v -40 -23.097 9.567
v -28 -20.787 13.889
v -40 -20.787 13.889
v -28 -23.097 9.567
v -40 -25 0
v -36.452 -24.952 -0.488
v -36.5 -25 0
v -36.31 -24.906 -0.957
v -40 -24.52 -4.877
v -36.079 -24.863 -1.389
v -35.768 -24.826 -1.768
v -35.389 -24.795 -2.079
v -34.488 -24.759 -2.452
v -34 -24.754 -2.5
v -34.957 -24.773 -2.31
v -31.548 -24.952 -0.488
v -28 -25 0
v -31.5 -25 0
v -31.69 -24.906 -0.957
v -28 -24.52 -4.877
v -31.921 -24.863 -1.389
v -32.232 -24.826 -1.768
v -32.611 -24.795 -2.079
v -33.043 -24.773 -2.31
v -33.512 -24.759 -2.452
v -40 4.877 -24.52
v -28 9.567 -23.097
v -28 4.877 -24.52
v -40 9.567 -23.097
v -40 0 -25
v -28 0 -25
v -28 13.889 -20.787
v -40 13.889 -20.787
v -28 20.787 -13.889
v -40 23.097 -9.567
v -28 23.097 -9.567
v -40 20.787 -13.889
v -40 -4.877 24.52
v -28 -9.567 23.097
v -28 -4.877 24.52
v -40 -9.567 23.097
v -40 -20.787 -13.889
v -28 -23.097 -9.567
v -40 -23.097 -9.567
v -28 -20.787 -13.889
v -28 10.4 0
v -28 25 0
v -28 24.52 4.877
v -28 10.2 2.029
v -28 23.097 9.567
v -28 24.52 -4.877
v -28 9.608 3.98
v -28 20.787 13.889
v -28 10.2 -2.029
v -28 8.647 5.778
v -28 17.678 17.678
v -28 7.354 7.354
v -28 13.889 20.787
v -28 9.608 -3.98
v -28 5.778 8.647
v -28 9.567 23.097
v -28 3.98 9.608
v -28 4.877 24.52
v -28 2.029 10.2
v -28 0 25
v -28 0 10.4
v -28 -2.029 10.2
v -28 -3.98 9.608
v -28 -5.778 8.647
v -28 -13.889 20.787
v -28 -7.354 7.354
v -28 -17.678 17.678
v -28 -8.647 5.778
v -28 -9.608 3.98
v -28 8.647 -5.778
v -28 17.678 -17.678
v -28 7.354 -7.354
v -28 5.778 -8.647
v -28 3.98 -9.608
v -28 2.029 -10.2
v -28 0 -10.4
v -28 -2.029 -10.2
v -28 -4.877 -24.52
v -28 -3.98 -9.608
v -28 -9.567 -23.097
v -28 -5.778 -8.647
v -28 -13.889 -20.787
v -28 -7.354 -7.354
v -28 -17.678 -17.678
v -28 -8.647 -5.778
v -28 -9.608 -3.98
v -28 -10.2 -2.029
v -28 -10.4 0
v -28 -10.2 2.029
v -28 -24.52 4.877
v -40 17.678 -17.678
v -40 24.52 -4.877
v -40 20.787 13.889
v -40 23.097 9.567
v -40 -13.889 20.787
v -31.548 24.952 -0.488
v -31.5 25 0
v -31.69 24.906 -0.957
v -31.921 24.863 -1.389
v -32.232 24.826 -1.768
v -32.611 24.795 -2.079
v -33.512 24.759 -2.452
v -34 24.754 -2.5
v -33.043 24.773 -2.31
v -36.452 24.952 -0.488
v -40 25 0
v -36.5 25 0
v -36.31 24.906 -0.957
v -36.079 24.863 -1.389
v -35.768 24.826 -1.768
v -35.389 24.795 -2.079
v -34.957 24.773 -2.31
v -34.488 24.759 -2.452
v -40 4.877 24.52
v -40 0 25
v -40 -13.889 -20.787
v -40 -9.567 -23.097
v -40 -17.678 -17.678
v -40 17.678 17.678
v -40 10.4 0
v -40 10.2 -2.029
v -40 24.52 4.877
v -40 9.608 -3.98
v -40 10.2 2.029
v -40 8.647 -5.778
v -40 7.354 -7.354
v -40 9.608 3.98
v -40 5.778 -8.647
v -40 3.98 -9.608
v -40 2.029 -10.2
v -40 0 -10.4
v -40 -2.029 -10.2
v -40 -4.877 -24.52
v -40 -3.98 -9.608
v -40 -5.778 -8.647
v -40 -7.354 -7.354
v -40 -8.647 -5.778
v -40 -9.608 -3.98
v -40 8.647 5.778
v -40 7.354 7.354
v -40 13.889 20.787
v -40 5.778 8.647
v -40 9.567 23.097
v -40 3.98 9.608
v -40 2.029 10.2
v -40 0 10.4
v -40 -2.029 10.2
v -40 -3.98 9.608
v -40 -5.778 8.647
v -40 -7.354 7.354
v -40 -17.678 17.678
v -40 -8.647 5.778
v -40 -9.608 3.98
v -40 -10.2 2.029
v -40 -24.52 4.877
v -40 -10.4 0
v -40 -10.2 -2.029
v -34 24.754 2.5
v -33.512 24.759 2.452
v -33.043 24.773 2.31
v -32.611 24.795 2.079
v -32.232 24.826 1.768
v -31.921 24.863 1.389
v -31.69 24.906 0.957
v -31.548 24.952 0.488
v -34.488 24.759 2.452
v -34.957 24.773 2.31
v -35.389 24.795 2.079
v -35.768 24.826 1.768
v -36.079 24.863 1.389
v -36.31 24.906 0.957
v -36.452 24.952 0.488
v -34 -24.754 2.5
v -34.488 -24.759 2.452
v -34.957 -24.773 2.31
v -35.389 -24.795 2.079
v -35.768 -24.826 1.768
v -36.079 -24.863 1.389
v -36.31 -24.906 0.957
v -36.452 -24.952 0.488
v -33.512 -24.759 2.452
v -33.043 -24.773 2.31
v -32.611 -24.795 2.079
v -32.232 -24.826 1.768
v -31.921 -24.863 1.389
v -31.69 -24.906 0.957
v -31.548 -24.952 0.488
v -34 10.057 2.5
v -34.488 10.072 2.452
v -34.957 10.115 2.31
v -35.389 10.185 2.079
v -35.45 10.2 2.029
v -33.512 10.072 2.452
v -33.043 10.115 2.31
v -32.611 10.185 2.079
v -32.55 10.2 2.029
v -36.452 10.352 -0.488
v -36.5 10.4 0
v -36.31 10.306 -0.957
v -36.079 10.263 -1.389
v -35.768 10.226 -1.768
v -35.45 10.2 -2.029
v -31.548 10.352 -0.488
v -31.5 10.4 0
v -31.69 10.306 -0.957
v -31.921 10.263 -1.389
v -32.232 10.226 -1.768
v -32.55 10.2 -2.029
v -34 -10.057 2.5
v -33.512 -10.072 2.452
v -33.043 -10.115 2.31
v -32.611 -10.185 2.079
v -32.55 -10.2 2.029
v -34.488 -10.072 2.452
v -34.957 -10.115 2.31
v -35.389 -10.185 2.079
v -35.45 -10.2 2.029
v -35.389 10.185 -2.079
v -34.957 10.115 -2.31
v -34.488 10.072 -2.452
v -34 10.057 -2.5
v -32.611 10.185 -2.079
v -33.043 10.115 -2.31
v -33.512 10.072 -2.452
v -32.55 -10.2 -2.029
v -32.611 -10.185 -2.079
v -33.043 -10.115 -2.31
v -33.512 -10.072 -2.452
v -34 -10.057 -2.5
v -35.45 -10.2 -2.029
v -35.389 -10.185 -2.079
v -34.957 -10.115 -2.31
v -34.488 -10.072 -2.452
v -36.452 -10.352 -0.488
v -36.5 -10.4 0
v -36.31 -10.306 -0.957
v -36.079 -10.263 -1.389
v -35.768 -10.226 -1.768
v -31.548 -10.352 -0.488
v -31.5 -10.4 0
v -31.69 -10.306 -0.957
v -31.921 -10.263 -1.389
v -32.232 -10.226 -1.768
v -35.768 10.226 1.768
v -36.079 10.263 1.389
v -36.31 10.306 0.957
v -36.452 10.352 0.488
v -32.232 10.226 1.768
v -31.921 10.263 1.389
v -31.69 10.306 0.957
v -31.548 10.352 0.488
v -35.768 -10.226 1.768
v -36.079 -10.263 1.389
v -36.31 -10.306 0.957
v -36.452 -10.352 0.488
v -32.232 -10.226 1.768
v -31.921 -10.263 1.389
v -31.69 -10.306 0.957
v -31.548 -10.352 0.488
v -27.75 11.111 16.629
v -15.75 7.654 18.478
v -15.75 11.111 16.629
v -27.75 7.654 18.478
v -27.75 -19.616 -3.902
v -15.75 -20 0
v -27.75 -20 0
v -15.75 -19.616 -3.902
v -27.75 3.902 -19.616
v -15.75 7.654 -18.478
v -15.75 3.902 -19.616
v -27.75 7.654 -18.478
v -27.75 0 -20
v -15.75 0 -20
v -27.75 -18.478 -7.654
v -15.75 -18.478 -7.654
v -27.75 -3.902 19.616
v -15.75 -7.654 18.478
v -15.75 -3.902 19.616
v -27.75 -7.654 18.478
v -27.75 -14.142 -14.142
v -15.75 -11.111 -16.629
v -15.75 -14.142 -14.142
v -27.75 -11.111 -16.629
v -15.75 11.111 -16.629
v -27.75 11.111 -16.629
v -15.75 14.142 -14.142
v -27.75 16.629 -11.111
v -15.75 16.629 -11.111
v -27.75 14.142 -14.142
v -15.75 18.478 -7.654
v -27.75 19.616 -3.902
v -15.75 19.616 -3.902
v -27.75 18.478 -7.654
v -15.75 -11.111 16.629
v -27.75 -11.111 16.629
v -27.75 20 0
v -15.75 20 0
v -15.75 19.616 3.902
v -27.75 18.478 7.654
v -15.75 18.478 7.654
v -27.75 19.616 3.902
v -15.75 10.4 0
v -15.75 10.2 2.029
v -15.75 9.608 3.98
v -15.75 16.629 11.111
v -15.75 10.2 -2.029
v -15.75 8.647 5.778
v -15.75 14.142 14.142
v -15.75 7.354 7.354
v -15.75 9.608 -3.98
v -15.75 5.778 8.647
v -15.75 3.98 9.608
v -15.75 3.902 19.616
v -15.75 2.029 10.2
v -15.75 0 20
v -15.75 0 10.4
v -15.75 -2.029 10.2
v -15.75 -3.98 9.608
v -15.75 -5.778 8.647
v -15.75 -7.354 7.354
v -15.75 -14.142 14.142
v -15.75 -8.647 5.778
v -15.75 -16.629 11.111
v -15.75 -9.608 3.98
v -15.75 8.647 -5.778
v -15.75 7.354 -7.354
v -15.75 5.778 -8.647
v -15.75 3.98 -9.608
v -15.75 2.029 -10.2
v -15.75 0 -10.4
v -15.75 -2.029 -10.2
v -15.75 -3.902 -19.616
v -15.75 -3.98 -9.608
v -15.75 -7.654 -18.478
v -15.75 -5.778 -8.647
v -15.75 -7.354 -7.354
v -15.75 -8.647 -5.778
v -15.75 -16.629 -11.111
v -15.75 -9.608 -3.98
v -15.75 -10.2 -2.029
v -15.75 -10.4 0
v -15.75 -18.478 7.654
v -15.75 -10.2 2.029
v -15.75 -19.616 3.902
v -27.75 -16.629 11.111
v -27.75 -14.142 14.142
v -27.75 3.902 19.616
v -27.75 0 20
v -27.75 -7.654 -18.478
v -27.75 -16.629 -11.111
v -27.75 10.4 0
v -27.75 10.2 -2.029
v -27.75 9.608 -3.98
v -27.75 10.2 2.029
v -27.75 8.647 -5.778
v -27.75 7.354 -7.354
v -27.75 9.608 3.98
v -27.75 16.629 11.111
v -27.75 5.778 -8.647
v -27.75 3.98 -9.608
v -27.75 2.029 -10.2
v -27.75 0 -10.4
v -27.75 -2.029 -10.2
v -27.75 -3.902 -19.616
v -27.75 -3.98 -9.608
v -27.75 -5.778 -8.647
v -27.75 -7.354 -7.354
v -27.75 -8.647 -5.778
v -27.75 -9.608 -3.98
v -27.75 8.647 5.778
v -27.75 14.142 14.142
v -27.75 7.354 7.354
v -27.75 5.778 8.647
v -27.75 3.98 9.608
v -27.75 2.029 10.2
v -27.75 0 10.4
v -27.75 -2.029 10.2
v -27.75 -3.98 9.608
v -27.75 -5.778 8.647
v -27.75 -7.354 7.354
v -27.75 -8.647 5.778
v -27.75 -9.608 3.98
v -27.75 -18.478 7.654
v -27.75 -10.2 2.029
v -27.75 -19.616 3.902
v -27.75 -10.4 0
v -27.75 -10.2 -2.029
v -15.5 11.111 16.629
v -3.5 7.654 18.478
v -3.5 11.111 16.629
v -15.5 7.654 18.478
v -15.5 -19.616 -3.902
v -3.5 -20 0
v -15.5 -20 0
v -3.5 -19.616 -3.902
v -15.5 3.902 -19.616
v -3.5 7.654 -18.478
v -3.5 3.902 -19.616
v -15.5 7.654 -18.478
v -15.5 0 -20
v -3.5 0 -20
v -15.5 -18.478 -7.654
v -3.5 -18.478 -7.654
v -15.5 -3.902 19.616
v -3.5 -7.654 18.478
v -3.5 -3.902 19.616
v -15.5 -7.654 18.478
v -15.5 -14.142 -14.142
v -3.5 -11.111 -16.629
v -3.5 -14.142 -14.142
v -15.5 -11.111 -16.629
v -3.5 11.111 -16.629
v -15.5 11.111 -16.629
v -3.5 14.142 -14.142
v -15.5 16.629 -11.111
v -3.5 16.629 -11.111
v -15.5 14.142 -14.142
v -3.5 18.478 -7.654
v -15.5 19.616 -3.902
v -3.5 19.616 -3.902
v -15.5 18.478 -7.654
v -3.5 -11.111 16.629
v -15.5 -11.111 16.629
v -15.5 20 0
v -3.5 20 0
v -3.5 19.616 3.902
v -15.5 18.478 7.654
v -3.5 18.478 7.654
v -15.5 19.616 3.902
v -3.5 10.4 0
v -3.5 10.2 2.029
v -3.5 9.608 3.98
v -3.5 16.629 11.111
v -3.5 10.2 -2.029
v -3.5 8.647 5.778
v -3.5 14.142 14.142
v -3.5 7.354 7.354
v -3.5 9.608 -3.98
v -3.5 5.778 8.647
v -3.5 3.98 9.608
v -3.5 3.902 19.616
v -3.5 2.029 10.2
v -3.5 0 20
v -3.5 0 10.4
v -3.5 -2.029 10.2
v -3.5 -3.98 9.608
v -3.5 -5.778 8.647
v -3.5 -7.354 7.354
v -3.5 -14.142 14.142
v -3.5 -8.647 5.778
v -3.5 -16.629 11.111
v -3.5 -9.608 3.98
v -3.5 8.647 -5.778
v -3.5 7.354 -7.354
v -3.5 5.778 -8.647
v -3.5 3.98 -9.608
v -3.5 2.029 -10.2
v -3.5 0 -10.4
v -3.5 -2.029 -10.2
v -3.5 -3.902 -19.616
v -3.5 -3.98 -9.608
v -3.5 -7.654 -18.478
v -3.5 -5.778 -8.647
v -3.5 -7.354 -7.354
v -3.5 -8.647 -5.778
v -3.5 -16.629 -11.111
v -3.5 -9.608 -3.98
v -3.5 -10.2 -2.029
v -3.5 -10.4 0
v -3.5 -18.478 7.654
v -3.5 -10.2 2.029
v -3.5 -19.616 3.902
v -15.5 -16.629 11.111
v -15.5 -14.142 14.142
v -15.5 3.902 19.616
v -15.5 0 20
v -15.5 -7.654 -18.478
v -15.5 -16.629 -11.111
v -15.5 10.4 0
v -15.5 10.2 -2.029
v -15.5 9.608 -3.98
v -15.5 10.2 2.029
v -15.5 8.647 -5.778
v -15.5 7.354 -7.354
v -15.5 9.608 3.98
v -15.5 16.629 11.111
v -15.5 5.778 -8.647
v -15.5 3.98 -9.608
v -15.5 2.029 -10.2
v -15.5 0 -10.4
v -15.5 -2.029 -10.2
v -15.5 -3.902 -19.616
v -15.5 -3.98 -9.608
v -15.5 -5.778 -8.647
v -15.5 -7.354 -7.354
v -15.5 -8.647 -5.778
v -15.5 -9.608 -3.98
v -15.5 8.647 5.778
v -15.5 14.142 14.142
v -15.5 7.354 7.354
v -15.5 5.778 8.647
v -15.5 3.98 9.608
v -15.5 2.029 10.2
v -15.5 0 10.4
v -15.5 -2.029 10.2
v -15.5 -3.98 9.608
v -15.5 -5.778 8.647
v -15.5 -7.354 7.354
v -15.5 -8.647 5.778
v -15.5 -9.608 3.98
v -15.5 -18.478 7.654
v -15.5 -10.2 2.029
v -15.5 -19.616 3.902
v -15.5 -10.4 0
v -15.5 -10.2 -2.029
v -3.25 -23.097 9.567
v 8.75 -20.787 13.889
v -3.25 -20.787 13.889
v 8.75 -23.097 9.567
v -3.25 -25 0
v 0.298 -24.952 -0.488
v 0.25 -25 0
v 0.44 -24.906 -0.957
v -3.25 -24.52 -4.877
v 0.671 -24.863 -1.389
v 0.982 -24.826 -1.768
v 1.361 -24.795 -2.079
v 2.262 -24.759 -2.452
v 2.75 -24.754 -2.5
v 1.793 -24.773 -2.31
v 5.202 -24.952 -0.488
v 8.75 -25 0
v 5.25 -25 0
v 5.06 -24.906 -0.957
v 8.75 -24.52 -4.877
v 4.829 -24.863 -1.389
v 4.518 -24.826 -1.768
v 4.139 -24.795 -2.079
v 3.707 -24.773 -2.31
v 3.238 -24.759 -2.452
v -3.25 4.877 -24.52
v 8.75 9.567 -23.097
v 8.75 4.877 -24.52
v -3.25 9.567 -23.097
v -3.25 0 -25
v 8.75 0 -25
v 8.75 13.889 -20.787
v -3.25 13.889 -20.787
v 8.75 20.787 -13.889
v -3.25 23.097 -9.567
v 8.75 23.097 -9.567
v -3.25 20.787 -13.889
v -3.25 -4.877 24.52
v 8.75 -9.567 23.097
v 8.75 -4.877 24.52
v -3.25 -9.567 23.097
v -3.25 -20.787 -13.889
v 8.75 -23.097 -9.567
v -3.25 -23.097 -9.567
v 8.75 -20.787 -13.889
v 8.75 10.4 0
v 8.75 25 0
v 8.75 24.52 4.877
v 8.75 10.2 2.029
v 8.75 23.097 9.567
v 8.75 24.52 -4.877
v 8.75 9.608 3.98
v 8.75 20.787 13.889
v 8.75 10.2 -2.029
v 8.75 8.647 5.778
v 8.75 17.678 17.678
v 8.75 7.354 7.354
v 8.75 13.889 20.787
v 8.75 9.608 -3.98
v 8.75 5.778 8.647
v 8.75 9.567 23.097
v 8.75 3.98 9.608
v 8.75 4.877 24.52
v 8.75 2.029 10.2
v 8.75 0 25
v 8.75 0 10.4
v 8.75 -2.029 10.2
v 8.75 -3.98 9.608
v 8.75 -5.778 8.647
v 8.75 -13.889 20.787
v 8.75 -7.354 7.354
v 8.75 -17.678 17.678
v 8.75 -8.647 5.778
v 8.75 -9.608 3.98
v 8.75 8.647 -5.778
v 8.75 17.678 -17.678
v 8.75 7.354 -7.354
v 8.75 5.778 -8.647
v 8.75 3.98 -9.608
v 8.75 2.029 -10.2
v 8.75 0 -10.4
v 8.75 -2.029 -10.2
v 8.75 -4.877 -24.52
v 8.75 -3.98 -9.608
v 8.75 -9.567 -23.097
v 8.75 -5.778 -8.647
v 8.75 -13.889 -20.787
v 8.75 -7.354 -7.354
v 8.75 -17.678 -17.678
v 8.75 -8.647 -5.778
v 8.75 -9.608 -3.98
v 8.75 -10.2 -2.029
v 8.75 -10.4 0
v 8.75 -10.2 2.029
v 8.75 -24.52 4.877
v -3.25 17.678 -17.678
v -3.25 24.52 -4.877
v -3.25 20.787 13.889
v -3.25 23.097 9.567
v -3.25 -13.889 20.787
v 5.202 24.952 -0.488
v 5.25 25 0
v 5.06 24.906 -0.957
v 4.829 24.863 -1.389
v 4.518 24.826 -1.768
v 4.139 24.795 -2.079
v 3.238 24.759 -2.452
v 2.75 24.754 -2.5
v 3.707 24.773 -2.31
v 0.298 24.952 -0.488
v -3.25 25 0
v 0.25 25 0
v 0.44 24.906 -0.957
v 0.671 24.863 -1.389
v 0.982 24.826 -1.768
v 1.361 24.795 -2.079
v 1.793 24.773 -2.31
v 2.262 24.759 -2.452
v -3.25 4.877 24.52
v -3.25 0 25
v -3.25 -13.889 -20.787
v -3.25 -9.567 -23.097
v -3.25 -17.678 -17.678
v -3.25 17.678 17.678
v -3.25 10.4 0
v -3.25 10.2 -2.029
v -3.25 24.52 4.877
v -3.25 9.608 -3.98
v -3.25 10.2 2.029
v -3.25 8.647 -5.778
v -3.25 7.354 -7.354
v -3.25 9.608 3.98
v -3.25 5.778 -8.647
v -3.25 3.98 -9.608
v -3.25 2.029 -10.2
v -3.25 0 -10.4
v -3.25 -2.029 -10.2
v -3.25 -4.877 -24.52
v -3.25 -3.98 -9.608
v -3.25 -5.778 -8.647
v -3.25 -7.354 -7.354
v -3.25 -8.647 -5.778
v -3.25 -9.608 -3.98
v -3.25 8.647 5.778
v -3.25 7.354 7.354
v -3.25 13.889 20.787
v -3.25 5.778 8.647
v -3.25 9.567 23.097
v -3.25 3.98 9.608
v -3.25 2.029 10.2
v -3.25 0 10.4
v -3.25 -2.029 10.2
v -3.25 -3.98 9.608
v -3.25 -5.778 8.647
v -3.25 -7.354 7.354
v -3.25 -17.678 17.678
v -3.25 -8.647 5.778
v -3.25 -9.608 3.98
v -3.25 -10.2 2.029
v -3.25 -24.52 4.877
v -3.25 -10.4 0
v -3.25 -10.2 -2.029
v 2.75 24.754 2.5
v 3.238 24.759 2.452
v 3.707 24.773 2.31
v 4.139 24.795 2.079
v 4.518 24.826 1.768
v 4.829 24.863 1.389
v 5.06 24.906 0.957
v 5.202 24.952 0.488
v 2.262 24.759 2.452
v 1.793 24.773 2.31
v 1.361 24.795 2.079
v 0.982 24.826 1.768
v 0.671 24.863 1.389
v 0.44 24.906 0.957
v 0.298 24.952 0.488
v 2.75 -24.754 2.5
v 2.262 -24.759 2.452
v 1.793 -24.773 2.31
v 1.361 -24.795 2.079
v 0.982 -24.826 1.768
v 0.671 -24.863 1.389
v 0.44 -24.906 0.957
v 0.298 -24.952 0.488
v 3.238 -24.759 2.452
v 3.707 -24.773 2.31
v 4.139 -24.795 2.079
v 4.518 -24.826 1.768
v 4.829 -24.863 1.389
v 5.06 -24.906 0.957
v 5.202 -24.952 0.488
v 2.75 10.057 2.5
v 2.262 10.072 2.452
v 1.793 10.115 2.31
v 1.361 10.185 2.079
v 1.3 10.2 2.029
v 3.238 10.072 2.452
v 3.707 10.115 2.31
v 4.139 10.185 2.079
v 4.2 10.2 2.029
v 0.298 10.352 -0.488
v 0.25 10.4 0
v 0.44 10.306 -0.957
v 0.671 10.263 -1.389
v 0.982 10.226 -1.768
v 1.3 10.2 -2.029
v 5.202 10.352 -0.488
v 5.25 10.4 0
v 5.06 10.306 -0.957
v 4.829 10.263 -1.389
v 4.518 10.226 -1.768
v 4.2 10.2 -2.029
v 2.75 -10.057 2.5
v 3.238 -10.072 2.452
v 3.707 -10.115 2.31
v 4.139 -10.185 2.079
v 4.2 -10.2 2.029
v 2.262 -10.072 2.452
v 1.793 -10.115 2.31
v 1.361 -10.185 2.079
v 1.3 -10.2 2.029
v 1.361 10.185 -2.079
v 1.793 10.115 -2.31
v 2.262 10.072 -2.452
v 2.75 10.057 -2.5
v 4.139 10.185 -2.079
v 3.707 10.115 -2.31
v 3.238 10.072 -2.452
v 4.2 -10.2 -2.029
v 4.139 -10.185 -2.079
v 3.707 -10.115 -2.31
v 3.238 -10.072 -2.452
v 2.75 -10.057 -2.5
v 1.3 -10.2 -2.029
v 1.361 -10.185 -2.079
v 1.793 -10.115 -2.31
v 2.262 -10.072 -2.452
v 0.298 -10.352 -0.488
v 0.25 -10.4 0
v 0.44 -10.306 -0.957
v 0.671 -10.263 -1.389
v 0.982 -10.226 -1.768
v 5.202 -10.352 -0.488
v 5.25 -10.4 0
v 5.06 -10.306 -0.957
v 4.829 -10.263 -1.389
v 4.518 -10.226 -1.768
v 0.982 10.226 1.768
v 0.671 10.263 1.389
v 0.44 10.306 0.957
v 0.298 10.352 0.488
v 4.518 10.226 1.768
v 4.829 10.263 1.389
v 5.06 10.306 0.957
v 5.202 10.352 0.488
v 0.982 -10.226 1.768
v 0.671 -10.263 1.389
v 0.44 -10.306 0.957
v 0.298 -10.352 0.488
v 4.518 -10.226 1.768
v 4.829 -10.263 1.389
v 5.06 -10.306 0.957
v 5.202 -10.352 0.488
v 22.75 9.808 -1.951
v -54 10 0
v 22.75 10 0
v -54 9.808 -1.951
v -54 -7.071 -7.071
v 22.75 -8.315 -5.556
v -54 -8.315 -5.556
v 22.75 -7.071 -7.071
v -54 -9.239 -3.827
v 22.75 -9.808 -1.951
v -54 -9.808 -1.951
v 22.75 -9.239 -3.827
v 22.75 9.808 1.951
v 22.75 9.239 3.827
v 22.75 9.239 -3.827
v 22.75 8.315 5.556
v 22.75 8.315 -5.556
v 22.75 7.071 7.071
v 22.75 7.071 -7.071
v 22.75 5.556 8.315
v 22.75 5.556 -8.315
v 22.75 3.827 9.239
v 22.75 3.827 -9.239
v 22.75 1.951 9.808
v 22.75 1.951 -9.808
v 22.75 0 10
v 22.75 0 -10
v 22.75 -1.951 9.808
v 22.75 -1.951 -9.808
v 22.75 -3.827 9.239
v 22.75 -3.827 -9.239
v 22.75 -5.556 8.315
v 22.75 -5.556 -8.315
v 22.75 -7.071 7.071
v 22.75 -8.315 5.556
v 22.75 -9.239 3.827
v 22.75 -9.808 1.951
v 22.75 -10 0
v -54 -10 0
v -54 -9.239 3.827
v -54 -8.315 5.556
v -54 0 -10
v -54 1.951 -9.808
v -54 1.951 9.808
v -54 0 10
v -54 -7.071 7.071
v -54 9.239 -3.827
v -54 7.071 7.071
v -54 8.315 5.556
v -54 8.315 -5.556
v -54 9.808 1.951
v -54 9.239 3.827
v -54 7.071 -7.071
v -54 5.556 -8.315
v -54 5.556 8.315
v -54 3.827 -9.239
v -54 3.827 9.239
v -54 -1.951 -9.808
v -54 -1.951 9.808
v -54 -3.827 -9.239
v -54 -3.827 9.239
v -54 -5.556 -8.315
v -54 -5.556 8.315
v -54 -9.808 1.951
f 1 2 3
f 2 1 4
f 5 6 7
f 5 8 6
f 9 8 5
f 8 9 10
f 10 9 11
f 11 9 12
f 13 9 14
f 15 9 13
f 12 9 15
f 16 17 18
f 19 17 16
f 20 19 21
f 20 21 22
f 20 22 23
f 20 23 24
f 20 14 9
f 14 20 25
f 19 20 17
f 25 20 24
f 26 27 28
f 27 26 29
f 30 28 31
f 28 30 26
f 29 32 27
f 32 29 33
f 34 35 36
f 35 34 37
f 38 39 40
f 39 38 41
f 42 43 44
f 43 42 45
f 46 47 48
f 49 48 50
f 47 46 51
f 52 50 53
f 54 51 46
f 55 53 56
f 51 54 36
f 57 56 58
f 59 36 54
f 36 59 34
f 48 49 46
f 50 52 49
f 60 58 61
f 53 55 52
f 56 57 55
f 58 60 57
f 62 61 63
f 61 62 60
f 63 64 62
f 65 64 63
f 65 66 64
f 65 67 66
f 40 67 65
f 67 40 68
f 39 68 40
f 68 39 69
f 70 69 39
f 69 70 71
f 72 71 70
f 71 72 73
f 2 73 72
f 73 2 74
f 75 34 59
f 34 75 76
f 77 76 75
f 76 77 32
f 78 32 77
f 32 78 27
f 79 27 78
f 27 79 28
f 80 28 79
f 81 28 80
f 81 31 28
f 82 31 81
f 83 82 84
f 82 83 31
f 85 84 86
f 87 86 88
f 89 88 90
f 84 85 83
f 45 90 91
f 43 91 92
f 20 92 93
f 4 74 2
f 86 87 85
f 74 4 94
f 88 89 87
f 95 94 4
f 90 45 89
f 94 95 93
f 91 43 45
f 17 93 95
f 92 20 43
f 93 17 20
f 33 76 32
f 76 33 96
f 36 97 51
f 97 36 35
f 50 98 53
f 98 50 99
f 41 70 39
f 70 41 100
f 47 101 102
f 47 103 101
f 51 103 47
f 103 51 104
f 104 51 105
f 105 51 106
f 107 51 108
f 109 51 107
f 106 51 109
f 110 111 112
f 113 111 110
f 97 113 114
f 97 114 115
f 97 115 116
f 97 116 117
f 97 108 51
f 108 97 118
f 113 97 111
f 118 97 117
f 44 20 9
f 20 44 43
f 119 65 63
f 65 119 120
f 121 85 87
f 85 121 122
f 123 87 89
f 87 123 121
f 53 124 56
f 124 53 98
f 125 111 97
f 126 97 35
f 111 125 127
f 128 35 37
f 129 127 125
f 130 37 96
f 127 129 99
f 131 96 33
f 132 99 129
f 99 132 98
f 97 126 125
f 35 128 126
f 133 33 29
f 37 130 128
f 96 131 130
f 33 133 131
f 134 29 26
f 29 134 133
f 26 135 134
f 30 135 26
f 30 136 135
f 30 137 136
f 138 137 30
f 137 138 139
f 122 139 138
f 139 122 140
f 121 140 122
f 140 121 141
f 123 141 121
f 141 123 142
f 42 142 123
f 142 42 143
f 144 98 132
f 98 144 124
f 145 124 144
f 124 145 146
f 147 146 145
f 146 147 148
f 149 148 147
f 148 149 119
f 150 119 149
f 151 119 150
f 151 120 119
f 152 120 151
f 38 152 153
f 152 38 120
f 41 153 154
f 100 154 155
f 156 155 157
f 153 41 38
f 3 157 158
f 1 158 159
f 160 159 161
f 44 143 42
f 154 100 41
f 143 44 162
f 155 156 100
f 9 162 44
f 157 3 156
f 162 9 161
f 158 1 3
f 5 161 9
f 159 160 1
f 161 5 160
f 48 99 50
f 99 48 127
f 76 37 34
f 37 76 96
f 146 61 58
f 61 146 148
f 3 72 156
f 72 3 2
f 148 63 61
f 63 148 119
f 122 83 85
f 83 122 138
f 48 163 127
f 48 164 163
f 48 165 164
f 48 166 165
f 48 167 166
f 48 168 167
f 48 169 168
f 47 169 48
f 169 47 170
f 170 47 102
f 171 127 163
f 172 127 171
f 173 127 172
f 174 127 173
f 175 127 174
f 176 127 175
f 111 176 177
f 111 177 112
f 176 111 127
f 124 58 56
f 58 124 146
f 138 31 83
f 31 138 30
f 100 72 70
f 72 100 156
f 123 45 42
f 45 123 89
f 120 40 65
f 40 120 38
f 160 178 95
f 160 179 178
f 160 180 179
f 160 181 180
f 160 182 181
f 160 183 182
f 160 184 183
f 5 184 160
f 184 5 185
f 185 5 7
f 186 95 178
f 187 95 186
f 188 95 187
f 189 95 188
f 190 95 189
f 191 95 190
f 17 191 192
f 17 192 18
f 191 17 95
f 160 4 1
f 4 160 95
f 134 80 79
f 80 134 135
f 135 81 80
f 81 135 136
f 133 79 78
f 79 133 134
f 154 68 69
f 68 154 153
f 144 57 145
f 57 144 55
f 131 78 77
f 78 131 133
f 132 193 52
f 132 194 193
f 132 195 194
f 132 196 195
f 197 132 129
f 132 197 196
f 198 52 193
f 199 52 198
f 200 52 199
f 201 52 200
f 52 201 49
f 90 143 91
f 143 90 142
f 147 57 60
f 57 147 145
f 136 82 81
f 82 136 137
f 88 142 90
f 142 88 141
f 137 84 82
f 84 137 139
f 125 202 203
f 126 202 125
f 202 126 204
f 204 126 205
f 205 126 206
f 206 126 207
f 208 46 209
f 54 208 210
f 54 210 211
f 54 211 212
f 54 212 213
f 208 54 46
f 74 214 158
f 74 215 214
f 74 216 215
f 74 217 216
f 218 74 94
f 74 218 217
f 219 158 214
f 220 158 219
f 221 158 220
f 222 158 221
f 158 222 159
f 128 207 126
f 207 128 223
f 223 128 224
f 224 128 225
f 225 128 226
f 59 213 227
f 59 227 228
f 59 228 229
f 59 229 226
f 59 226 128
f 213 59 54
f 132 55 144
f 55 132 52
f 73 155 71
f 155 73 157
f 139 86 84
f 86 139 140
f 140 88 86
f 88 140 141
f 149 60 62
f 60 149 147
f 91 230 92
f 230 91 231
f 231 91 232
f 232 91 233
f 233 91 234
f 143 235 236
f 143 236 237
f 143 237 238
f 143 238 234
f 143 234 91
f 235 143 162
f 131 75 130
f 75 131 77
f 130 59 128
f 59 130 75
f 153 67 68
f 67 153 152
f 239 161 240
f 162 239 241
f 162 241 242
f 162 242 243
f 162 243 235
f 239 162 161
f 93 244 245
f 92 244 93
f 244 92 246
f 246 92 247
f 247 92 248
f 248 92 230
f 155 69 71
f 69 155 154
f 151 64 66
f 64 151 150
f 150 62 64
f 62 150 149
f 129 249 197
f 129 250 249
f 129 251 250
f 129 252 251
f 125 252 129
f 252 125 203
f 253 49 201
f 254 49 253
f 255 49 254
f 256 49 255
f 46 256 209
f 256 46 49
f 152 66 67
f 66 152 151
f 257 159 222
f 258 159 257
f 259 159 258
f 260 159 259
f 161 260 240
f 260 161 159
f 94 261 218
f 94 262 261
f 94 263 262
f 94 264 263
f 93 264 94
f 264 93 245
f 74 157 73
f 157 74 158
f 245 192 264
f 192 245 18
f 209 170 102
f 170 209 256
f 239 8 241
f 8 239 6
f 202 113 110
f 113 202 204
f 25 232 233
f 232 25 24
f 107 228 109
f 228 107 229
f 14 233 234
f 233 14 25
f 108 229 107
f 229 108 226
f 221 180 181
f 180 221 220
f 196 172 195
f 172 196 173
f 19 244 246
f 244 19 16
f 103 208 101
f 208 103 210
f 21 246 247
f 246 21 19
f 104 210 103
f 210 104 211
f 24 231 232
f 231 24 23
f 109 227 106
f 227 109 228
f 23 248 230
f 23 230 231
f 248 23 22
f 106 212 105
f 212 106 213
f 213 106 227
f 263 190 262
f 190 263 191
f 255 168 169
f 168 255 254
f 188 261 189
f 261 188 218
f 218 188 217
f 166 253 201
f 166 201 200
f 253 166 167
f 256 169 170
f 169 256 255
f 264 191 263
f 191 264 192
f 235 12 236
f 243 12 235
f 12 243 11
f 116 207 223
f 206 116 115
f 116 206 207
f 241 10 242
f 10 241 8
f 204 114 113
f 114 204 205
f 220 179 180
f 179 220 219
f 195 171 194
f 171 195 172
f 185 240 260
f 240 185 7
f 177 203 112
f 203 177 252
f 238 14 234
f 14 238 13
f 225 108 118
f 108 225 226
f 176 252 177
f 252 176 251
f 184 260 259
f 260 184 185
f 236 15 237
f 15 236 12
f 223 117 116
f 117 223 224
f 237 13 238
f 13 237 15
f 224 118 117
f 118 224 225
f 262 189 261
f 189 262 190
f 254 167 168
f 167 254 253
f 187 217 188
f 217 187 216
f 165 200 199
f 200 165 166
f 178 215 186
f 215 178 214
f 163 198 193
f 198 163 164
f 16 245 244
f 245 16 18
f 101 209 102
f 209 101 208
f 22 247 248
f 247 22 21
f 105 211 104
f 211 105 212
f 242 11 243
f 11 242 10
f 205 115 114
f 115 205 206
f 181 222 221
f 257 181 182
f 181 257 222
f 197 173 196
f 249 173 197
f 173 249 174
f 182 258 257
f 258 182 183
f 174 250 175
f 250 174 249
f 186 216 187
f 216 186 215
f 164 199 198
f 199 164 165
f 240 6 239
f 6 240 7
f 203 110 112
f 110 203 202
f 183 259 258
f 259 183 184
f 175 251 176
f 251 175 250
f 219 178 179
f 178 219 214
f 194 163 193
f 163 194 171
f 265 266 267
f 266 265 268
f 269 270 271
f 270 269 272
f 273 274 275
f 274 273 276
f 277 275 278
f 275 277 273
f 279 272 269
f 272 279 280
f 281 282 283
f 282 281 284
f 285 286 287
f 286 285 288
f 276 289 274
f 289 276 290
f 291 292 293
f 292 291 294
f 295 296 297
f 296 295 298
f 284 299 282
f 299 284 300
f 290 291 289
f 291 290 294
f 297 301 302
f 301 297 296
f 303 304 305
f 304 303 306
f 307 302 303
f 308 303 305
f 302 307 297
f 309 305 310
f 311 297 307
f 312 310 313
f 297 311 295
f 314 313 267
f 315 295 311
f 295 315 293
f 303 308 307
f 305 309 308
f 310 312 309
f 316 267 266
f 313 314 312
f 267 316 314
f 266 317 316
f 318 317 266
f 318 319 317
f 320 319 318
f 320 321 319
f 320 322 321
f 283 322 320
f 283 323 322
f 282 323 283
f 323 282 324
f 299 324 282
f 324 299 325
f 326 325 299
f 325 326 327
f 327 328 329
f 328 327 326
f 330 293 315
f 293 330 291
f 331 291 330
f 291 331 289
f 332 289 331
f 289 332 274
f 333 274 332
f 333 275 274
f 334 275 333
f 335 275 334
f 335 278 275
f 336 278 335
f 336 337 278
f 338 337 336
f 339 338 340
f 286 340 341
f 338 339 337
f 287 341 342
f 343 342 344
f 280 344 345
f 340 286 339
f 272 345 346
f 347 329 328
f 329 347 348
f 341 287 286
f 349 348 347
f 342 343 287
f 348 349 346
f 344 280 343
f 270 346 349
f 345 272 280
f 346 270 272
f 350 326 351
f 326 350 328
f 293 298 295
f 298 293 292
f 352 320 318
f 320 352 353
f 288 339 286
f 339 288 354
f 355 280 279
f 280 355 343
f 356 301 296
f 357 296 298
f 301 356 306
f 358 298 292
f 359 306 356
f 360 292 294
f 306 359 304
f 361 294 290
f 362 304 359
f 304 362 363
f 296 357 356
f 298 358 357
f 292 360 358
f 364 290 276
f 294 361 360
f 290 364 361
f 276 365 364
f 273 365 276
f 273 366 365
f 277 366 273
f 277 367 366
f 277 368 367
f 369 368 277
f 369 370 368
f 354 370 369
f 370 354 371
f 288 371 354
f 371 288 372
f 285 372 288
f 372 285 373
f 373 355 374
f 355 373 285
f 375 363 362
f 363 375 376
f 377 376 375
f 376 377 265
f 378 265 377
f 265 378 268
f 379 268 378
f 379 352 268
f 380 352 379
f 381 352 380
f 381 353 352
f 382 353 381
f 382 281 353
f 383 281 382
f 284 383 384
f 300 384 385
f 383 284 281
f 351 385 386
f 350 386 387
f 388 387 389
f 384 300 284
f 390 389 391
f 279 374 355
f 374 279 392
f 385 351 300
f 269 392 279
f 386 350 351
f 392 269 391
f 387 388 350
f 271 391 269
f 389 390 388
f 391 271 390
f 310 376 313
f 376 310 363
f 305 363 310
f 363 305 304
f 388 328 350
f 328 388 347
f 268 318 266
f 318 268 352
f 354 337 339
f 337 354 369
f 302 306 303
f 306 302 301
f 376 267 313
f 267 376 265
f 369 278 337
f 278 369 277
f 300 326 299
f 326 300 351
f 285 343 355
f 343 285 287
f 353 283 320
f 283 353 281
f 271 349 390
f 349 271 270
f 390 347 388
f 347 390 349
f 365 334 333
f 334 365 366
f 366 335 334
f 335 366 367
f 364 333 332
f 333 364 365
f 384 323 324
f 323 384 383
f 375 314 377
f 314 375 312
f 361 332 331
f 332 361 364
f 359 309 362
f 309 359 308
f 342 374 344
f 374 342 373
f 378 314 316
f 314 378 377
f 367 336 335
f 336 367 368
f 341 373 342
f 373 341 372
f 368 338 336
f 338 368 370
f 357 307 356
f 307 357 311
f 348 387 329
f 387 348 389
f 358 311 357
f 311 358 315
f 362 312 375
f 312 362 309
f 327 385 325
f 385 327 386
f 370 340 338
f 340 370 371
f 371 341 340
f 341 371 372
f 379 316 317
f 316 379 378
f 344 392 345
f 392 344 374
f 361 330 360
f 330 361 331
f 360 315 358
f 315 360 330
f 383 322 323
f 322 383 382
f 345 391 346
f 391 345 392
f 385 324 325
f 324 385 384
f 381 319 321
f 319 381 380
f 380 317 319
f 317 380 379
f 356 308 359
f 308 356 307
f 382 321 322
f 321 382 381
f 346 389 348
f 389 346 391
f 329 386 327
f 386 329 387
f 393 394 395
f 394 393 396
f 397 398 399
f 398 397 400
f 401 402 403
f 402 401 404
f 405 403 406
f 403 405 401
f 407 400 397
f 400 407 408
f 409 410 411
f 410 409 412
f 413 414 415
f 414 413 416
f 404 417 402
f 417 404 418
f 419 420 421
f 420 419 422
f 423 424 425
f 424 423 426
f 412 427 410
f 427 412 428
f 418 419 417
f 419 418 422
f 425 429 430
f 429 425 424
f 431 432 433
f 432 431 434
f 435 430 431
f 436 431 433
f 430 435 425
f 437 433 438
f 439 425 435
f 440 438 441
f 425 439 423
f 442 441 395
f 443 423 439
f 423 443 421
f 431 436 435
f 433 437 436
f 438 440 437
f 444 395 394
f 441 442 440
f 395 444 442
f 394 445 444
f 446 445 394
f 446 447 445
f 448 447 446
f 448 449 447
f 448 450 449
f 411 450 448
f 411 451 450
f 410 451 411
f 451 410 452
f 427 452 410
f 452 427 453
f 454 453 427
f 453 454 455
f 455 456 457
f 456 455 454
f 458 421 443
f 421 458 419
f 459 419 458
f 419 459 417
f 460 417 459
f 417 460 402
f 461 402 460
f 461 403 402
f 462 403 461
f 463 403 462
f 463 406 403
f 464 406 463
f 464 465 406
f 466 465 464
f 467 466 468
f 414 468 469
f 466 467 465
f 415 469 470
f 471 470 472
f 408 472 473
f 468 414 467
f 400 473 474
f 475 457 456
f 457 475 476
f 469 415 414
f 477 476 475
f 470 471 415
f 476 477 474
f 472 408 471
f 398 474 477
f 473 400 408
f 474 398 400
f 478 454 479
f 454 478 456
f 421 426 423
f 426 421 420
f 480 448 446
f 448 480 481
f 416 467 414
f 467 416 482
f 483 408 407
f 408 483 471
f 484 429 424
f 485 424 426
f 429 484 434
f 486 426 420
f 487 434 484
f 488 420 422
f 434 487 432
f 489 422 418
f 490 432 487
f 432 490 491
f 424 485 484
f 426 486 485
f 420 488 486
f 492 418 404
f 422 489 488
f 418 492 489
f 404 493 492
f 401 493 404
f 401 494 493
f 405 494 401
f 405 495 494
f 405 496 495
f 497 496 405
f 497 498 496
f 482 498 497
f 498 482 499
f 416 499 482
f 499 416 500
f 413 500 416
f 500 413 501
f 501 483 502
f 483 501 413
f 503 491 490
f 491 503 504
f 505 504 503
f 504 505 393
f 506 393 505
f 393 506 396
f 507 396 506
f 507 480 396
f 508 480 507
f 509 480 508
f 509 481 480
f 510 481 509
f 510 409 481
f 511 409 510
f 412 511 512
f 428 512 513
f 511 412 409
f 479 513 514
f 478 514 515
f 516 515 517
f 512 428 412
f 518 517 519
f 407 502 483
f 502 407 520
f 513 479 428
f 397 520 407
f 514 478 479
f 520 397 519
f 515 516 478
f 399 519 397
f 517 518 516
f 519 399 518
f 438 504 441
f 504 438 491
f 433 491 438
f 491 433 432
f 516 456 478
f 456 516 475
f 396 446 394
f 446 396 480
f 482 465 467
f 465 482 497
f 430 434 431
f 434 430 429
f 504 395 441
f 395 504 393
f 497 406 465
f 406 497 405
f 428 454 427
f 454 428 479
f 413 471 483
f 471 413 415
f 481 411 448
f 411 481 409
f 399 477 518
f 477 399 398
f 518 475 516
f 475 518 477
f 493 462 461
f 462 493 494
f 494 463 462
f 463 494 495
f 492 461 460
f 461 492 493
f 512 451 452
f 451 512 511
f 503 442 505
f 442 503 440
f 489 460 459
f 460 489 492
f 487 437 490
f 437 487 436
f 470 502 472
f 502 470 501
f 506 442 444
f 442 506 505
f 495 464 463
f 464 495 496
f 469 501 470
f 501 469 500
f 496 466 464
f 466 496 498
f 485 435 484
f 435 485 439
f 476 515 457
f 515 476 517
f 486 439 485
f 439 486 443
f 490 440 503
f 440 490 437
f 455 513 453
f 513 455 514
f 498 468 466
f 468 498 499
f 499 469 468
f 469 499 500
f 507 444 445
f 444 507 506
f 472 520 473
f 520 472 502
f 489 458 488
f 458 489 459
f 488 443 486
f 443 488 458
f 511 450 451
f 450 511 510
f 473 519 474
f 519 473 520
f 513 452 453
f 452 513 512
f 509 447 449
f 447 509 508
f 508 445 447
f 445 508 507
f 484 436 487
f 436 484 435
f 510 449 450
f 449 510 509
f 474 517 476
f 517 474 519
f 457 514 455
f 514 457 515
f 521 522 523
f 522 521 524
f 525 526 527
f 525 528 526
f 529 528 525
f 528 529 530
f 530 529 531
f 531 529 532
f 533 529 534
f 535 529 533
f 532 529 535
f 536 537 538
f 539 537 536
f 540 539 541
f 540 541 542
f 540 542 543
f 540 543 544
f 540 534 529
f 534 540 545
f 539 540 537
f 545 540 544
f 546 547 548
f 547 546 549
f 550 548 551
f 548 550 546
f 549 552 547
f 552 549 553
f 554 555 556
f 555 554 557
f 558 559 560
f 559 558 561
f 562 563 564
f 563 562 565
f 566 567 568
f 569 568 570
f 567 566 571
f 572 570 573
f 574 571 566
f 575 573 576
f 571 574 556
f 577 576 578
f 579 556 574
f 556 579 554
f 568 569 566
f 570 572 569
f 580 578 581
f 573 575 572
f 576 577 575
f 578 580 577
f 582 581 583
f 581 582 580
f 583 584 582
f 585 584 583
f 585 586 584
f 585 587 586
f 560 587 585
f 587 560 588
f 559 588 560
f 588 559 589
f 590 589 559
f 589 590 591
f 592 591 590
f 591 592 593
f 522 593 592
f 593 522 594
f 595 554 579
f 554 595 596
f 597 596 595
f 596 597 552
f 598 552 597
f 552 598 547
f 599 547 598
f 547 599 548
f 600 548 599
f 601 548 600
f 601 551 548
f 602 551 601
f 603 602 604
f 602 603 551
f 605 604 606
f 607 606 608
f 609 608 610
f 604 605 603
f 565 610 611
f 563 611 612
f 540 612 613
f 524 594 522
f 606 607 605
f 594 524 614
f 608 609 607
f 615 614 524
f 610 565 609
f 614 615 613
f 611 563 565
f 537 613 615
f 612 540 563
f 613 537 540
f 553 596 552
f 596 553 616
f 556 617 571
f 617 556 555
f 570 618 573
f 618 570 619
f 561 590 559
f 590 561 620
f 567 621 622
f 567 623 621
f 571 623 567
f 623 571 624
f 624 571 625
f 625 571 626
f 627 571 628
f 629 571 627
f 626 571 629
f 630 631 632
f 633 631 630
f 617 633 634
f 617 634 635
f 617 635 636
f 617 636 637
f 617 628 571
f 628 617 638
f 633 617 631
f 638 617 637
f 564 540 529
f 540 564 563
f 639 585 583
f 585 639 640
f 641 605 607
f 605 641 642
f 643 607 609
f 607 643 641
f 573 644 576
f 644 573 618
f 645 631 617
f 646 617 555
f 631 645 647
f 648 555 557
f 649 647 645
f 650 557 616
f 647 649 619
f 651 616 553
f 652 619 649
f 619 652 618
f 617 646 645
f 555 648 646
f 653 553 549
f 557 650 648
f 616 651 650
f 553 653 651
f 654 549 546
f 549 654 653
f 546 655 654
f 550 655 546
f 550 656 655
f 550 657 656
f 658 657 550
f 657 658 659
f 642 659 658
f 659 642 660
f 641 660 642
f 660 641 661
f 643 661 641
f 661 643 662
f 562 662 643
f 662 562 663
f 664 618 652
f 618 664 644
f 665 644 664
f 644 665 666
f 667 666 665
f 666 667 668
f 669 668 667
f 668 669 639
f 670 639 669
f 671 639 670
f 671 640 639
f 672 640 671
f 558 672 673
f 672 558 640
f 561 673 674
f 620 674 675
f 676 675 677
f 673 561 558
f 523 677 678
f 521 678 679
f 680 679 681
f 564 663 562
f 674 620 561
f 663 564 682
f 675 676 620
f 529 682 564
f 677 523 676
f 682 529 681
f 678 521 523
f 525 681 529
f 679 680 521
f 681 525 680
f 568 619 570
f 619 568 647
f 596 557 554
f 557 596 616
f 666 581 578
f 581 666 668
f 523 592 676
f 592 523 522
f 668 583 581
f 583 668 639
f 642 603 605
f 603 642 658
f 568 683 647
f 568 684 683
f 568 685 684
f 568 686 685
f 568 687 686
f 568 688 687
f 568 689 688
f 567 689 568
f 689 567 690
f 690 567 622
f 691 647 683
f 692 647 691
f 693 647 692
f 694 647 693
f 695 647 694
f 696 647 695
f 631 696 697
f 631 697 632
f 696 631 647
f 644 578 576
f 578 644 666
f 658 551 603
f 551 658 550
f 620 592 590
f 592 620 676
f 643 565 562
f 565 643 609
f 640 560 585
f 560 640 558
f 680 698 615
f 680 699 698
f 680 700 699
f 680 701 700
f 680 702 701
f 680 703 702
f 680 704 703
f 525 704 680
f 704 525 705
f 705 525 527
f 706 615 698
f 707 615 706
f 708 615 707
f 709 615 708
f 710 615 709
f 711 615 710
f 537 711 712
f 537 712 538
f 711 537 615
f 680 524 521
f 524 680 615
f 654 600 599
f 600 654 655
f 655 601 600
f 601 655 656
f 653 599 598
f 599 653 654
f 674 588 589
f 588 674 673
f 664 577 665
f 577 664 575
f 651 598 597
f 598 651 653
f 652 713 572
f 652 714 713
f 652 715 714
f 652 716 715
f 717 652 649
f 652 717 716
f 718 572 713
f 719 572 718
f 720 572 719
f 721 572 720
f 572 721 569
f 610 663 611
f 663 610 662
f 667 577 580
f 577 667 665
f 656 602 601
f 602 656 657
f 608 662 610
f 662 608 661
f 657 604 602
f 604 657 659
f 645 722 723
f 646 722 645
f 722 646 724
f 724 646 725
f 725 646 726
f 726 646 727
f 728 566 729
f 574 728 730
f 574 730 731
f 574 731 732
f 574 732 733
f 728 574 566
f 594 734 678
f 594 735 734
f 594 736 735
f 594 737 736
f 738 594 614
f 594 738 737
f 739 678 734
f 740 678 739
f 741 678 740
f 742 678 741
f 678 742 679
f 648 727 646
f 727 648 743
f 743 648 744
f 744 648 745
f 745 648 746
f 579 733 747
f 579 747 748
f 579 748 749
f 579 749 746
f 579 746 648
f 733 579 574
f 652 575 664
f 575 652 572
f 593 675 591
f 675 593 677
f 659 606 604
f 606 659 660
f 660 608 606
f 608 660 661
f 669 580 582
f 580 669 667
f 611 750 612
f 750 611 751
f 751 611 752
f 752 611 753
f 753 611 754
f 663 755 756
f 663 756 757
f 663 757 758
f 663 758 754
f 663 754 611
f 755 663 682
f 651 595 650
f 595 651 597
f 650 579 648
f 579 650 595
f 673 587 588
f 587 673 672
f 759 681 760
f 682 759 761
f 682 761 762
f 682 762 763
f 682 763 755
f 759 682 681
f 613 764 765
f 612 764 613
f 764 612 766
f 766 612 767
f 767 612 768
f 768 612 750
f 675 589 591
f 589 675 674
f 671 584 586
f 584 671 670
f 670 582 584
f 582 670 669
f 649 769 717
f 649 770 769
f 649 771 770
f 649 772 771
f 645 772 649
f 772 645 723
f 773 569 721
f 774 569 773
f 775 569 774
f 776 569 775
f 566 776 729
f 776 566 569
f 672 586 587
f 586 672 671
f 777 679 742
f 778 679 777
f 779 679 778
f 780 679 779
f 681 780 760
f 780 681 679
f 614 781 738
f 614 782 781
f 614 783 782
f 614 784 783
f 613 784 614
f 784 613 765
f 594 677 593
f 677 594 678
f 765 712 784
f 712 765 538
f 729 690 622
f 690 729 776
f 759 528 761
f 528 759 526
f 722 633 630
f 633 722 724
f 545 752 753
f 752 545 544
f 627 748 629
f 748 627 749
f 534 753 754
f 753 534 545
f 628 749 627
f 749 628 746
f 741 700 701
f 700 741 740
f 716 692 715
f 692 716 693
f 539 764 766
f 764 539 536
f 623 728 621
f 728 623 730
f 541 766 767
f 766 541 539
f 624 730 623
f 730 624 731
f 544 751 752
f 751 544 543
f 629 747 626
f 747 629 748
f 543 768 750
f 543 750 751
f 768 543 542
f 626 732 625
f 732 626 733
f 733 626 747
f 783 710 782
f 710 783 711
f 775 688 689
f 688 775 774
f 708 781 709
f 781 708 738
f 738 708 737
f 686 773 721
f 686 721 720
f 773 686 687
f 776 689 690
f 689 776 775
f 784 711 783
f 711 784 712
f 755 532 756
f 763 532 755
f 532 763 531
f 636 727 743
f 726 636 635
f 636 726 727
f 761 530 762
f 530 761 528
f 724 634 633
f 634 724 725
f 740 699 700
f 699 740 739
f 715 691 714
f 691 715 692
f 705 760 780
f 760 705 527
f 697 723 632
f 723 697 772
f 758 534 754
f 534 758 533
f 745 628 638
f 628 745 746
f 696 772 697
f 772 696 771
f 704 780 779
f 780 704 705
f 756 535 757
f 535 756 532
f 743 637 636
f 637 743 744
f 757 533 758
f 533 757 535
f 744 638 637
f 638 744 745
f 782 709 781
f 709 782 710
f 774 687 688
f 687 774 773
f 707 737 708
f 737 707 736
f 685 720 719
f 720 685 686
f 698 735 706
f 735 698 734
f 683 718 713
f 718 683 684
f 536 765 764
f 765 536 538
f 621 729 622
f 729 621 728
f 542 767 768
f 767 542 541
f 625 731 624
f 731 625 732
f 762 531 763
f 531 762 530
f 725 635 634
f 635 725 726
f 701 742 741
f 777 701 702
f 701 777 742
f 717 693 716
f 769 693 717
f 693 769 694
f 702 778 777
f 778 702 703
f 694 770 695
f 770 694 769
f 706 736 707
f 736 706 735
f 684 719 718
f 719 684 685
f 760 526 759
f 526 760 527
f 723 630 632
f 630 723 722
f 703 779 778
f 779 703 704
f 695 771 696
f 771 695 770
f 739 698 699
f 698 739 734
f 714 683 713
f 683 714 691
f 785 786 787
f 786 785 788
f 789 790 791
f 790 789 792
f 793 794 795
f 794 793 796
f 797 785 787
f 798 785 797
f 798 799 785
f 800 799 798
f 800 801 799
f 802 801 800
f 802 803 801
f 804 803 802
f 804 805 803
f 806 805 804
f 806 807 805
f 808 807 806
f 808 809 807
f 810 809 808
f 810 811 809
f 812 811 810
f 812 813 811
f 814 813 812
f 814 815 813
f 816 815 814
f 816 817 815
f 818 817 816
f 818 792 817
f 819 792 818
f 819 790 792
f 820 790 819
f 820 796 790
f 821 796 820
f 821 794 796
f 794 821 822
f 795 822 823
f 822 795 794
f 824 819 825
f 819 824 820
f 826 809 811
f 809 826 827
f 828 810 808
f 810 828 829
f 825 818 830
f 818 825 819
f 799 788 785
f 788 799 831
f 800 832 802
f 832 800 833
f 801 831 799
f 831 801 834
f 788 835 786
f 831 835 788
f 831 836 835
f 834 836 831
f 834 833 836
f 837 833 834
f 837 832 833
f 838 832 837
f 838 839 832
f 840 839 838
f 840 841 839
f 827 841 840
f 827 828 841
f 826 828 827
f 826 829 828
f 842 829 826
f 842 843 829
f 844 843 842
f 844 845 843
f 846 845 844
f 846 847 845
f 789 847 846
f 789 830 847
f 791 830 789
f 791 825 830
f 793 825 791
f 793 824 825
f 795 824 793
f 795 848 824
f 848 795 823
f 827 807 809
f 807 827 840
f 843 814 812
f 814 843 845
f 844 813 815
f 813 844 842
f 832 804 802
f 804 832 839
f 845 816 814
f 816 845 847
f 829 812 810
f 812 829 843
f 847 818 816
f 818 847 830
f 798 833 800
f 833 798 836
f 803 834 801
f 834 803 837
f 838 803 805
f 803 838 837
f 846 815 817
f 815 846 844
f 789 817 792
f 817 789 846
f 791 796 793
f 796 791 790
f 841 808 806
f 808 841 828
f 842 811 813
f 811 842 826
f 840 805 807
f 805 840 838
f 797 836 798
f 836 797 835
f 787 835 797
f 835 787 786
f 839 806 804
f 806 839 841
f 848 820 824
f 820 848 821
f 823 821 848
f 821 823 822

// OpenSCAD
$fn = 32;

// ------------------------------------------------------------------------
// Shaft with rings and collars: d20 shaft, 4 rings
// Every part is its own module, assembly() places them once.
// ------------------------------------------------------------------------

// --- part 1 ---
module shaft() {
  translate([0, 0, -38.375]) cylinder(h = 76.75, d = 20);
}

// --- part 2 ---
module collar_a() {
  difference() {
    cylinder(h = 12, d = 50);
    translate([0, 0, -1]) cylinder(h = 14, d = 20.8);
    translate([0, 0, 6]) rotate([90, 0, 0]) cylinder(h = 52, d = 5, center = true);
  }
}

// --- part 3 ---
module spacer_a() {
  difference() {
      translate([0, 0, 0]) cylinder(h = 12, d = 40);
      translate([0, 0, -1]) cylinder(h = 14, d = 20.8);
    }
}

// --- part 4 ---
module spacer_b() {
  difference() {
      translate([0, 0, 0]) cylinder(h = 12, d = 40);
      translate([0, 0, -1]) cylinder(h = 14, d = 20.8);
    }
}

// --- part 5 ---
module collar_b() {
  difference() {
    cylinder(h = 12, d = 50);
    translate([0, 0, -1]) cylinder(h = 14, d = 20.8);
    translate([0, 0, 6]) rotate([90, 0, 0]) cylinder(h = 52, d = 5, center = true);
  }
}

// --- assembly ---
module assembly() {
  translate([-15.625, 0, 0]) rotate([0, 90, 0]) shaft();
  translate([-40, 0, 0]) rotate([0, 90, 0]) collar_a();
  translate([-27.75, 0, 0]) rotate([0, 90, 0]) spacer_a();
  translate([-15.5, 0, 0]) rotate([0, 90, 0]) spacer_b();
  translate([-3.25, 0, 0]) rotate([0, 90, 0]) collar_b();
}

assembly();
